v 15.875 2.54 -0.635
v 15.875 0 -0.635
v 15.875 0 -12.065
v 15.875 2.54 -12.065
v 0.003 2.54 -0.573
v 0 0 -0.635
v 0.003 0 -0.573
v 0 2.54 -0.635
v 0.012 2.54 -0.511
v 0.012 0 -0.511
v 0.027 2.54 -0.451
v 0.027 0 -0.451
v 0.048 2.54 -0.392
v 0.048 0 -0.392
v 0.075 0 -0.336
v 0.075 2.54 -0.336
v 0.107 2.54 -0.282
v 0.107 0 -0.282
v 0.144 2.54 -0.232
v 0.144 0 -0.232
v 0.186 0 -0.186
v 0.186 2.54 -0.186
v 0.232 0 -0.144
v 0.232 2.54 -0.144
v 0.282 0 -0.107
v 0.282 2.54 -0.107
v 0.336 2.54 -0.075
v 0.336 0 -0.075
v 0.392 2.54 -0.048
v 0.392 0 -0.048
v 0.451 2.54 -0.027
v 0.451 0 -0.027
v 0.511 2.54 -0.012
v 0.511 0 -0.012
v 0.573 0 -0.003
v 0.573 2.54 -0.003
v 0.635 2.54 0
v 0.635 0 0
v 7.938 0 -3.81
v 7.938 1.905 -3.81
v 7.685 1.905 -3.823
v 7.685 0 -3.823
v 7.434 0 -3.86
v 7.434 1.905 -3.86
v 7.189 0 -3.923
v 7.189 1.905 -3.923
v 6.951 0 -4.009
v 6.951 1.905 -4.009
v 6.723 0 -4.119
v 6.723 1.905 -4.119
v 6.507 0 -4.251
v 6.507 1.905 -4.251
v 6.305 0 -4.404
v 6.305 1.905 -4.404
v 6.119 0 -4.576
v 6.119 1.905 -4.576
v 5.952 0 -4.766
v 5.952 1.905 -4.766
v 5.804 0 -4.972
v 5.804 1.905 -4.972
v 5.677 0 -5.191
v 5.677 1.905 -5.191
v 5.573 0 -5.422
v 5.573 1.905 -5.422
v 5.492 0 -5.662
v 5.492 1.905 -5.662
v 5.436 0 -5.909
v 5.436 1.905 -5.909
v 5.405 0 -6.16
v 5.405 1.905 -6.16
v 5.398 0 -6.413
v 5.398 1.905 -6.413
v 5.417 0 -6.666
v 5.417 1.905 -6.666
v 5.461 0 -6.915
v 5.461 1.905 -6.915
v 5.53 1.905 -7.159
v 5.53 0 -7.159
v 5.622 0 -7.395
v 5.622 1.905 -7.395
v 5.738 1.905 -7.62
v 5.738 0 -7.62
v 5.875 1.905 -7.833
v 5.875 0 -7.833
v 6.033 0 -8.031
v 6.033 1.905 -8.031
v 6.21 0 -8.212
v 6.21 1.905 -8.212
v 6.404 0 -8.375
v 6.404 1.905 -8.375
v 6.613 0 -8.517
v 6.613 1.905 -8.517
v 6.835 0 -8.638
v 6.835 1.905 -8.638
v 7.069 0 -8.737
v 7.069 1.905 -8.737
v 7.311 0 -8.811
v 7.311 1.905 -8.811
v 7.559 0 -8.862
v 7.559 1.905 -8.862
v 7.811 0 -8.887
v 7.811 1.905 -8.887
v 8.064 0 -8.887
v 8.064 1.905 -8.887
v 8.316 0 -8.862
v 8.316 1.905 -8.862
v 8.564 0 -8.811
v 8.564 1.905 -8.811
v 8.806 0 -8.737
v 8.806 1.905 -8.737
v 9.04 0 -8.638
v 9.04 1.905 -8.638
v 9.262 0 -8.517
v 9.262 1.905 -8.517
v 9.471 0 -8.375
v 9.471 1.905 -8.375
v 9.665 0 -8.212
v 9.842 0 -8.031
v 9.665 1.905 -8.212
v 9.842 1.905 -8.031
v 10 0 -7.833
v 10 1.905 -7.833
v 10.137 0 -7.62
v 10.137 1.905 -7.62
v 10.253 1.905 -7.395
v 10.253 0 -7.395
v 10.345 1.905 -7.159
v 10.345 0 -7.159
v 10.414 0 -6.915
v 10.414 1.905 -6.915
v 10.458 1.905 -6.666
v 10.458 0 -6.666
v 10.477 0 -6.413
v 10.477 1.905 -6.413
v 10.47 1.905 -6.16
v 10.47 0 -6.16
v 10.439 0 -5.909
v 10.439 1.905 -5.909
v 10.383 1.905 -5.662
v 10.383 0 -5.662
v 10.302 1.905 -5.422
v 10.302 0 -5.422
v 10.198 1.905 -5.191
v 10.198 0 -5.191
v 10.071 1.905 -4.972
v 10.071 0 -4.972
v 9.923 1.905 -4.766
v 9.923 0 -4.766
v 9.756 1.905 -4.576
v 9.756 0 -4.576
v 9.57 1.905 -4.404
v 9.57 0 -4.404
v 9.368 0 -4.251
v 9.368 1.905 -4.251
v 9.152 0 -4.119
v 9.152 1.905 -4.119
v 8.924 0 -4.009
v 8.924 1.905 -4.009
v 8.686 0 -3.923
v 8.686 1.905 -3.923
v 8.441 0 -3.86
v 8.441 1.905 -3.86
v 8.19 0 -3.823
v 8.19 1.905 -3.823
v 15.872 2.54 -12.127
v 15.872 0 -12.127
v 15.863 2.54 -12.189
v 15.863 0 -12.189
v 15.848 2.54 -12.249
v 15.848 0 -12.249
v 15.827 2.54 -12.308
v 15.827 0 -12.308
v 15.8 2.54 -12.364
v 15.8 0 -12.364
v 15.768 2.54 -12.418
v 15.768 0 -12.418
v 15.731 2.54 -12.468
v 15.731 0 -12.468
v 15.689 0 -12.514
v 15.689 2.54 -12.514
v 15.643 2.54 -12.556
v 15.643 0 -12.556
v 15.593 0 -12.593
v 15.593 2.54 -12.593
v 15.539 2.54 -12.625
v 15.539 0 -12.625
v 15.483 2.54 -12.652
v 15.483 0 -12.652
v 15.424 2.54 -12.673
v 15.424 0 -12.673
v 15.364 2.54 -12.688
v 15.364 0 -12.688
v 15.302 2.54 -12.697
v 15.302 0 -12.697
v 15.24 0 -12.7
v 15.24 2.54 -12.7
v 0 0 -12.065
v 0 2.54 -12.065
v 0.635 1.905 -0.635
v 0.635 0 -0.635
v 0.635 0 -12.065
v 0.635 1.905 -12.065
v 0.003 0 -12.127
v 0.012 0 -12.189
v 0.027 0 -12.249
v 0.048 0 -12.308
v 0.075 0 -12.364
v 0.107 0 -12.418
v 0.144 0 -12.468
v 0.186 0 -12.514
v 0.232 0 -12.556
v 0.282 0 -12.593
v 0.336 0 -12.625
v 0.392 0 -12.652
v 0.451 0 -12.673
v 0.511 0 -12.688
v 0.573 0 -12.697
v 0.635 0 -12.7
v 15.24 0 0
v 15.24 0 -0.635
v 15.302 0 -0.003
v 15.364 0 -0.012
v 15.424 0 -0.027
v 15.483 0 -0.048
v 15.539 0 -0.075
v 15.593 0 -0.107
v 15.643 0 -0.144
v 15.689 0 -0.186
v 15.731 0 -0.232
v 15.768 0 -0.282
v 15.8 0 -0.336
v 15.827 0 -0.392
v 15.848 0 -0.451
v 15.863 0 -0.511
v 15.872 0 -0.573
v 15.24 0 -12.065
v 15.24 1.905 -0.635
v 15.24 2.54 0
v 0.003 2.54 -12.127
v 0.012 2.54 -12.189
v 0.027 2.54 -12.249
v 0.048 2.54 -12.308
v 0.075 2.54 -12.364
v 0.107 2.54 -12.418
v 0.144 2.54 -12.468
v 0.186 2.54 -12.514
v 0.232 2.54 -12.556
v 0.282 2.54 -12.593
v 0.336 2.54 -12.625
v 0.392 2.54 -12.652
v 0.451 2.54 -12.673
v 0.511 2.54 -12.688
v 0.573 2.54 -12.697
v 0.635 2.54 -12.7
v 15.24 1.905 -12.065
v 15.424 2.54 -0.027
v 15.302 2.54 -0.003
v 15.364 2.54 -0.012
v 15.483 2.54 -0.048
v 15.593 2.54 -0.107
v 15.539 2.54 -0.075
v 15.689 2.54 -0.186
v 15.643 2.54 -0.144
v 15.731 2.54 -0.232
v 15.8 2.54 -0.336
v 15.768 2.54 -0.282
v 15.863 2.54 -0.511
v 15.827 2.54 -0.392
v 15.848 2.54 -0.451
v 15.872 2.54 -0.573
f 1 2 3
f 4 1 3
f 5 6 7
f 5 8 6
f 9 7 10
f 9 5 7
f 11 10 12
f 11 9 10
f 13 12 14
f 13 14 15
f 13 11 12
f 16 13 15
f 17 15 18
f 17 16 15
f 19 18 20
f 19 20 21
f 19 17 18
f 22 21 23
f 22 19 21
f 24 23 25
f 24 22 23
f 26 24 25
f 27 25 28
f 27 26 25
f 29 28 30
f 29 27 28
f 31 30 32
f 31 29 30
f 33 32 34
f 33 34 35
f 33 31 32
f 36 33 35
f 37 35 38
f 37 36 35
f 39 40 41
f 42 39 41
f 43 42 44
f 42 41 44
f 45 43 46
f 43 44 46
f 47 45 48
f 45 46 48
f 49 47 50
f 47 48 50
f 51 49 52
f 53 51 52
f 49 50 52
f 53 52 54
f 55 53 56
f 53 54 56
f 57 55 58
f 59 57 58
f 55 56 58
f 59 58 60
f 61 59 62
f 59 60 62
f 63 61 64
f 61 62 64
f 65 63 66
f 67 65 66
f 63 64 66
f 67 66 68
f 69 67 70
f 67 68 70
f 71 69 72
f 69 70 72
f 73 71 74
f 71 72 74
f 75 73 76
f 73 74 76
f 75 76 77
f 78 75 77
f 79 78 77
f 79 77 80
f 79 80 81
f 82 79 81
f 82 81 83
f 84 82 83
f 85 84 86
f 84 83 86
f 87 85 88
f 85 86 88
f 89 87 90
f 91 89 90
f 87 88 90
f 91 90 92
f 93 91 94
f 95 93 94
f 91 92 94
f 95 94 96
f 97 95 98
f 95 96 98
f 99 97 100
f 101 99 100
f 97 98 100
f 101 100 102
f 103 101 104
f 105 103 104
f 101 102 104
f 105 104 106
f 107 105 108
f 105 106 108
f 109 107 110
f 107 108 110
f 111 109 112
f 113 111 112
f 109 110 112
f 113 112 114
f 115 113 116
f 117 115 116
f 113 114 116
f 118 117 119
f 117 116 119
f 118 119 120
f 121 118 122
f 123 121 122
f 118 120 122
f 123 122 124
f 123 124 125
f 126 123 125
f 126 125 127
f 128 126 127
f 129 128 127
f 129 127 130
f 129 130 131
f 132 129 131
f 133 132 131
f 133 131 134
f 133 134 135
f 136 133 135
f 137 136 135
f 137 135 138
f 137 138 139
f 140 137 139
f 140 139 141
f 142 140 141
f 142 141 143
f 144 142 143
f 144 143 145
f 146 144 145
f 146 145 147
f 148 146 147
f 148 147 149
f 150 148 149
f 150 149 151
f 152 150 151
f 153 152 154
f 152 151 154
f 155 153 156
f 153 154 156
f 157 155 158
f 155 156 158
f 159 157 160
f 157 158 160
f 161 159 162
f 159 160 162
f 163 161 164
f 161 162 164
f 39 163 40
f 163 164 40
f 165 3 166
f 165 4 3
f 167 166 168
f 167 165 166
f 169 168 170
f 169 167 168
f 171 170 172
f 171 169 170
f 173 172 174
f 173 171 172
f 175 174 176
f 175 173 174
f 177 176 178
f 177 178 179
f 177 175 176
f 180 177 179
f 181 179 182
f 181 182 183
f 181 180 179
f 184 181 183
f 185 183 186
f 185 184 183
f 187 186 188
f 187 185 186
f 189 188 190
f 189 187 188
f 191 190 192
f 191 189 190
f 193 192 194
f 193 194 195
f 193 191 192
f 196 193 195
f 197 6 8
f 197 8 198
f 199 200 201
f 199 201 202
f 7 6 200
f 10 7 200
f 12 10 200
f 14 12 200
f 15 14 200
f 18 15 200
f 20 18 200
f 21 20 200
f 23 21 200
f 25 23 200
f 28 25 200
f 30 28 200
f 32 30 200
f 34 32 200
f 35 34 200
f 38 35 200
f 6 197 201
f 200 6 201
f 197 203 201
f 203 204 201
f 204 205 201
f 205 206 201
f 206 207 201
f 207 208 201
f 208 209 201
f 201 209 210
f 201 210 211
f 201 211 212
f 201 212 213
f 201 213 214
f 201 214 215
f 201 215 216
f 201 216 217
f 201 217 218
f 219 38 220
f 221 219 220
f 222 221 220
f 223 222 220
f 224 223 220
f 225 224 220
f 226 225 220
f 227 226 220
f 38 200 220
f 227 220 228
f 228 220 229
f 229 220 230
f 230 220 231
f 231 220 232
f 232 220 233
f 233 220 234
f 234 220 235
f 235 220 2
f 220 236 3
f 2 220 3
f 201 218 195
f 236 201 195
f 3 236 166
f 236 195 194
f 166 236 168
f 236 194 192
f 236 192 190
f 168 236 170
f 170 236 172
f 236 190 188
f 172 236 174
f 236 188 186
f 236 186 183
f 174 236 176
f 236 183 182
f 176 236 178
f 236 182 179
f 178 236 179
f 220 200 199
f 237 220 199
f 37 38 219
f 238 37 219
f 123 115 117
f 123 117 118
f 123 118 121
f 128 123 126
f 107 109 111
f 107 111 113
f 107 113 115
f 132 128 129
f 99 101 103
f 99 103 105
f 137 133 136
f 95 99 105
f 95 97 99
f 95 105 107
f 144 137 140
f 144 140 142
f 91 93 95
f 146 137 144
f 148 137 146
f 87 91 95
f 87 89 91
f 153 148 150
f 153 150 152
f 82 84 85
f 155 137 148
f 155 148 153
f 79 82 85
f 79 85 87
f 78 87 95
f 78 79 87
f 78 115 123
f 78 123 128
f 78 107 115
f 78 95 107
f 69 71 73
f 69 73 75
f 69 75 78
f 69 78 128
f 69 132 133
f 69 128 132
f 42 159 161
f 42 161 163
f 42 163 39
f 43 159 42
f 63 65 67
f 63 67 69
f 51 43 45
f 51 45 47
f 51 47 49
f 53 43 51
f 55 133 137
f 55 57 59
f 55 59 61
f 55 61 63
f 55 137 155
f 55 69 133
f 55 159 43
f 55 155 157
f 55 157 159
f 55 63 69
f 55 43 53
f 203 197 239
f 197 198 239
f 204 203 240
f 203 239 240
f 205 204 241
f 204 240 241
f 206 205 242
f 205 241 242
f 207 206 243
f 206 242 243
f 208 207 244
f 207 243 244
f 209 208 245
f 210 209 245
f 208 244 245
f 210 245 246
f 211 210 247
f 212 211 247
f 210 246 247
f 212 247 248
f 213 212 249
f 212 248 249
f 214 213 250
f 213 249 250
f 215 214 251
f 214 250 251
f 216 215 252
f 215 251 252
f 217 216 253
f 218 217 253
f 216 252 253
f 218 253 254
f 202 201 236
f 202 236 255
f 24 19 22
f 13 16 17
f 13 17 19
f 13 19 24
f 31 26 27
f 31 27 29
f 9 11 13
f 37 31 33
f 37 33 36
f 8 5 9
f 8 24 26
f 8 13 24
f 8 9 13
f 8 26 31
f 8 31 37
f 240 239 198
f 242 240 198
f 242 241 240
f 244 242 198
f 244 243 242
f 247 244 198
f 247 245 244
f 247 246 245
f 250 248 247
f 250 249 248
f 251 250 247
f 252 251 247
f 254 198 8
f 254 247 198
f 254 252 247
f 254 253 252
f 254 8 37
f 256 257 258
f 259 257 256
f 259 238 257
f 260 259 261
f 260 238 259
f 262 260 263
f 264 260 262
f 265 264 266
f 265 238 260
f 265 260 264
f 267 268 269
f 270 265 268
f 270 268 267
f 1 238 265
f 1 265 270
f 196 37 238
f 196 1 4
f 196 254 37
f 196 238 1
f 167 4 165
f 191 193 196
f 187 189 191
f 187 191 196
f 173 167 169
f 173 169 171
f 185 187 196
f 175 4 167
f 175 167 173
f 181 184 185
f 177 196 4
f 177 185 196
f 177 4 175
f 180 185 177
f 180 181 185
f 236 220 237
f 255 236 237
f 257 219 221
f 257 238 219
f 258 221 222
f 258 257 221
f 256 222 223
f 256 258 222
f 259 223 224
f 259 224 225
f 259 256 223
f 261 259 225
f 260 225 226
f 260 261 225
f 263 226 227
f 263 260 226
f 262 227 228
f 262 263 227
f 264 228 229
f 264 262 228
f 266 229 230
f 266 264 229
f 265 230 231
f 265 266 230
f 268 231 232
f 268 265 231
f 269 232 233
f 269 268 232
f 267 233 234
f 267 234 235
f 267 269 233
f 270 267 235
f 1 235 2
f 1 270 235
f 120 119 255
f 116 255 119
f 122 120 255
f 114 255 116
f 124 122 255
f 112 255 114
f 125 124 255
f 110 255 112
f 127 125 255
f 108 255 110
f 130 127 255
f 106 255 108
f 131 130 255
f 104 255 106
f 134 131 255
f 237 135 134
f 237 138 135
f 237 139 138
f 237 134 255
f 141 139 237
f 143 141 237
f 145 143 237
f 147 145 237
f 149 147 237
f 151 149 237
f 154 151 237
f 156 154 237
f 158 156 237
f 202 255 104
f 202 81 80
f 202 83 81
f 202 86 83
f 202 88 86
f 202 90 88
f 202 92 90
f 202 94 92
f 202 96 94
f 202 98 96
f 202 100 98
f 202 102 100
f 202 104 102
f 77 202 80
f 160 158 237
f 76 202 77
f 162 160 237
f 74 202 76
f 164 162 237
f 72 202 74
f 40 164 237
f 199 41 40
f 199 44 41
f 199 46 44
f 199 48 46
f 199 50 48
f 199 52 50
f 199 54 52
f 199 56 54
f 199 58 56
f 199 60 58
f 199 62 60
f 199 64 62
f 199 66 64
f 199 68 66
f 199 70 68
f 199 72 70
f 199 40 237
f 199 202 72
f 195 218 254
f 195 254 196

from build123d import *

# Parameters (mm, degrees)
SKETCH1_W           = 15.875
SKETCH1_H           = 12.7
BOSS_EXTRUDE1_DEPTH = 2.54
FILLET1_R           = 0.635
SHELL1_START        = 0.635
SHELL1_OUTLINE_W    = 1.905
SHELL1_OUTLINE_H    = 11.43
SHELL1_DEPTH        = 14.605
SKETCH2_R           = 2.54
BOSS_EXTRUDE2_DEPTH = 1.905


# Read off the part's stored shape, not the designer's step: Shell1
with BuildPart() as part:
    # Sketch1 → Boss-Extrude1 (new body)
    with BuildSketch(Plane(origin=(0, 0, 0), x_dir=(1, 0, 0), z_dir=(0, 1, 0))):
        with Locations((7.9375, 6.35)):
            Rectangle(SKETCH1_W, SKETCH1_H)
    extrude(amount=BOSS_EXTRUDE1_DEPTH)

    # Fillet1
    fillet1_edges = [part.edges().sort_by_distance(p)[0] for p in [
        (0, 1.27, -12.7),
        (15.875, 1.27, -12.7),
        (15.875, 1.27, 0),
        (0, 1.27, 0),
    ]]
    fillet(fillet1_edges, radius=FILLET1_R)

    # Shell1 outline → Shell1 (cut)
    with BuildSketch(Plane.YZ.offset(SHELL1_START)):
        with Locations((0.9525, -6.35)):
            Rectangle(SHELL1_OUTLINE_W, SHELL1_OUTLINE_H)
    extrude(amount=SHELL1_DEPTH, mode=Mode.SUBTRACT)

    # Sketch2 → Boss-Extrude2 (add)
    with BuildSketch(Plane(origin=(0, 1.905, 0), x_dir=(-1, 0, 0), z_dir=(0, -1, 0))):
        with Locations(Location((-7.9375, 6.35, 0), (0, 0, 270))):
            Circle(SKETCH2_R)
    extrude(amount=BOSS_EXTRUDE2_DEPTH)


solid = part.part
